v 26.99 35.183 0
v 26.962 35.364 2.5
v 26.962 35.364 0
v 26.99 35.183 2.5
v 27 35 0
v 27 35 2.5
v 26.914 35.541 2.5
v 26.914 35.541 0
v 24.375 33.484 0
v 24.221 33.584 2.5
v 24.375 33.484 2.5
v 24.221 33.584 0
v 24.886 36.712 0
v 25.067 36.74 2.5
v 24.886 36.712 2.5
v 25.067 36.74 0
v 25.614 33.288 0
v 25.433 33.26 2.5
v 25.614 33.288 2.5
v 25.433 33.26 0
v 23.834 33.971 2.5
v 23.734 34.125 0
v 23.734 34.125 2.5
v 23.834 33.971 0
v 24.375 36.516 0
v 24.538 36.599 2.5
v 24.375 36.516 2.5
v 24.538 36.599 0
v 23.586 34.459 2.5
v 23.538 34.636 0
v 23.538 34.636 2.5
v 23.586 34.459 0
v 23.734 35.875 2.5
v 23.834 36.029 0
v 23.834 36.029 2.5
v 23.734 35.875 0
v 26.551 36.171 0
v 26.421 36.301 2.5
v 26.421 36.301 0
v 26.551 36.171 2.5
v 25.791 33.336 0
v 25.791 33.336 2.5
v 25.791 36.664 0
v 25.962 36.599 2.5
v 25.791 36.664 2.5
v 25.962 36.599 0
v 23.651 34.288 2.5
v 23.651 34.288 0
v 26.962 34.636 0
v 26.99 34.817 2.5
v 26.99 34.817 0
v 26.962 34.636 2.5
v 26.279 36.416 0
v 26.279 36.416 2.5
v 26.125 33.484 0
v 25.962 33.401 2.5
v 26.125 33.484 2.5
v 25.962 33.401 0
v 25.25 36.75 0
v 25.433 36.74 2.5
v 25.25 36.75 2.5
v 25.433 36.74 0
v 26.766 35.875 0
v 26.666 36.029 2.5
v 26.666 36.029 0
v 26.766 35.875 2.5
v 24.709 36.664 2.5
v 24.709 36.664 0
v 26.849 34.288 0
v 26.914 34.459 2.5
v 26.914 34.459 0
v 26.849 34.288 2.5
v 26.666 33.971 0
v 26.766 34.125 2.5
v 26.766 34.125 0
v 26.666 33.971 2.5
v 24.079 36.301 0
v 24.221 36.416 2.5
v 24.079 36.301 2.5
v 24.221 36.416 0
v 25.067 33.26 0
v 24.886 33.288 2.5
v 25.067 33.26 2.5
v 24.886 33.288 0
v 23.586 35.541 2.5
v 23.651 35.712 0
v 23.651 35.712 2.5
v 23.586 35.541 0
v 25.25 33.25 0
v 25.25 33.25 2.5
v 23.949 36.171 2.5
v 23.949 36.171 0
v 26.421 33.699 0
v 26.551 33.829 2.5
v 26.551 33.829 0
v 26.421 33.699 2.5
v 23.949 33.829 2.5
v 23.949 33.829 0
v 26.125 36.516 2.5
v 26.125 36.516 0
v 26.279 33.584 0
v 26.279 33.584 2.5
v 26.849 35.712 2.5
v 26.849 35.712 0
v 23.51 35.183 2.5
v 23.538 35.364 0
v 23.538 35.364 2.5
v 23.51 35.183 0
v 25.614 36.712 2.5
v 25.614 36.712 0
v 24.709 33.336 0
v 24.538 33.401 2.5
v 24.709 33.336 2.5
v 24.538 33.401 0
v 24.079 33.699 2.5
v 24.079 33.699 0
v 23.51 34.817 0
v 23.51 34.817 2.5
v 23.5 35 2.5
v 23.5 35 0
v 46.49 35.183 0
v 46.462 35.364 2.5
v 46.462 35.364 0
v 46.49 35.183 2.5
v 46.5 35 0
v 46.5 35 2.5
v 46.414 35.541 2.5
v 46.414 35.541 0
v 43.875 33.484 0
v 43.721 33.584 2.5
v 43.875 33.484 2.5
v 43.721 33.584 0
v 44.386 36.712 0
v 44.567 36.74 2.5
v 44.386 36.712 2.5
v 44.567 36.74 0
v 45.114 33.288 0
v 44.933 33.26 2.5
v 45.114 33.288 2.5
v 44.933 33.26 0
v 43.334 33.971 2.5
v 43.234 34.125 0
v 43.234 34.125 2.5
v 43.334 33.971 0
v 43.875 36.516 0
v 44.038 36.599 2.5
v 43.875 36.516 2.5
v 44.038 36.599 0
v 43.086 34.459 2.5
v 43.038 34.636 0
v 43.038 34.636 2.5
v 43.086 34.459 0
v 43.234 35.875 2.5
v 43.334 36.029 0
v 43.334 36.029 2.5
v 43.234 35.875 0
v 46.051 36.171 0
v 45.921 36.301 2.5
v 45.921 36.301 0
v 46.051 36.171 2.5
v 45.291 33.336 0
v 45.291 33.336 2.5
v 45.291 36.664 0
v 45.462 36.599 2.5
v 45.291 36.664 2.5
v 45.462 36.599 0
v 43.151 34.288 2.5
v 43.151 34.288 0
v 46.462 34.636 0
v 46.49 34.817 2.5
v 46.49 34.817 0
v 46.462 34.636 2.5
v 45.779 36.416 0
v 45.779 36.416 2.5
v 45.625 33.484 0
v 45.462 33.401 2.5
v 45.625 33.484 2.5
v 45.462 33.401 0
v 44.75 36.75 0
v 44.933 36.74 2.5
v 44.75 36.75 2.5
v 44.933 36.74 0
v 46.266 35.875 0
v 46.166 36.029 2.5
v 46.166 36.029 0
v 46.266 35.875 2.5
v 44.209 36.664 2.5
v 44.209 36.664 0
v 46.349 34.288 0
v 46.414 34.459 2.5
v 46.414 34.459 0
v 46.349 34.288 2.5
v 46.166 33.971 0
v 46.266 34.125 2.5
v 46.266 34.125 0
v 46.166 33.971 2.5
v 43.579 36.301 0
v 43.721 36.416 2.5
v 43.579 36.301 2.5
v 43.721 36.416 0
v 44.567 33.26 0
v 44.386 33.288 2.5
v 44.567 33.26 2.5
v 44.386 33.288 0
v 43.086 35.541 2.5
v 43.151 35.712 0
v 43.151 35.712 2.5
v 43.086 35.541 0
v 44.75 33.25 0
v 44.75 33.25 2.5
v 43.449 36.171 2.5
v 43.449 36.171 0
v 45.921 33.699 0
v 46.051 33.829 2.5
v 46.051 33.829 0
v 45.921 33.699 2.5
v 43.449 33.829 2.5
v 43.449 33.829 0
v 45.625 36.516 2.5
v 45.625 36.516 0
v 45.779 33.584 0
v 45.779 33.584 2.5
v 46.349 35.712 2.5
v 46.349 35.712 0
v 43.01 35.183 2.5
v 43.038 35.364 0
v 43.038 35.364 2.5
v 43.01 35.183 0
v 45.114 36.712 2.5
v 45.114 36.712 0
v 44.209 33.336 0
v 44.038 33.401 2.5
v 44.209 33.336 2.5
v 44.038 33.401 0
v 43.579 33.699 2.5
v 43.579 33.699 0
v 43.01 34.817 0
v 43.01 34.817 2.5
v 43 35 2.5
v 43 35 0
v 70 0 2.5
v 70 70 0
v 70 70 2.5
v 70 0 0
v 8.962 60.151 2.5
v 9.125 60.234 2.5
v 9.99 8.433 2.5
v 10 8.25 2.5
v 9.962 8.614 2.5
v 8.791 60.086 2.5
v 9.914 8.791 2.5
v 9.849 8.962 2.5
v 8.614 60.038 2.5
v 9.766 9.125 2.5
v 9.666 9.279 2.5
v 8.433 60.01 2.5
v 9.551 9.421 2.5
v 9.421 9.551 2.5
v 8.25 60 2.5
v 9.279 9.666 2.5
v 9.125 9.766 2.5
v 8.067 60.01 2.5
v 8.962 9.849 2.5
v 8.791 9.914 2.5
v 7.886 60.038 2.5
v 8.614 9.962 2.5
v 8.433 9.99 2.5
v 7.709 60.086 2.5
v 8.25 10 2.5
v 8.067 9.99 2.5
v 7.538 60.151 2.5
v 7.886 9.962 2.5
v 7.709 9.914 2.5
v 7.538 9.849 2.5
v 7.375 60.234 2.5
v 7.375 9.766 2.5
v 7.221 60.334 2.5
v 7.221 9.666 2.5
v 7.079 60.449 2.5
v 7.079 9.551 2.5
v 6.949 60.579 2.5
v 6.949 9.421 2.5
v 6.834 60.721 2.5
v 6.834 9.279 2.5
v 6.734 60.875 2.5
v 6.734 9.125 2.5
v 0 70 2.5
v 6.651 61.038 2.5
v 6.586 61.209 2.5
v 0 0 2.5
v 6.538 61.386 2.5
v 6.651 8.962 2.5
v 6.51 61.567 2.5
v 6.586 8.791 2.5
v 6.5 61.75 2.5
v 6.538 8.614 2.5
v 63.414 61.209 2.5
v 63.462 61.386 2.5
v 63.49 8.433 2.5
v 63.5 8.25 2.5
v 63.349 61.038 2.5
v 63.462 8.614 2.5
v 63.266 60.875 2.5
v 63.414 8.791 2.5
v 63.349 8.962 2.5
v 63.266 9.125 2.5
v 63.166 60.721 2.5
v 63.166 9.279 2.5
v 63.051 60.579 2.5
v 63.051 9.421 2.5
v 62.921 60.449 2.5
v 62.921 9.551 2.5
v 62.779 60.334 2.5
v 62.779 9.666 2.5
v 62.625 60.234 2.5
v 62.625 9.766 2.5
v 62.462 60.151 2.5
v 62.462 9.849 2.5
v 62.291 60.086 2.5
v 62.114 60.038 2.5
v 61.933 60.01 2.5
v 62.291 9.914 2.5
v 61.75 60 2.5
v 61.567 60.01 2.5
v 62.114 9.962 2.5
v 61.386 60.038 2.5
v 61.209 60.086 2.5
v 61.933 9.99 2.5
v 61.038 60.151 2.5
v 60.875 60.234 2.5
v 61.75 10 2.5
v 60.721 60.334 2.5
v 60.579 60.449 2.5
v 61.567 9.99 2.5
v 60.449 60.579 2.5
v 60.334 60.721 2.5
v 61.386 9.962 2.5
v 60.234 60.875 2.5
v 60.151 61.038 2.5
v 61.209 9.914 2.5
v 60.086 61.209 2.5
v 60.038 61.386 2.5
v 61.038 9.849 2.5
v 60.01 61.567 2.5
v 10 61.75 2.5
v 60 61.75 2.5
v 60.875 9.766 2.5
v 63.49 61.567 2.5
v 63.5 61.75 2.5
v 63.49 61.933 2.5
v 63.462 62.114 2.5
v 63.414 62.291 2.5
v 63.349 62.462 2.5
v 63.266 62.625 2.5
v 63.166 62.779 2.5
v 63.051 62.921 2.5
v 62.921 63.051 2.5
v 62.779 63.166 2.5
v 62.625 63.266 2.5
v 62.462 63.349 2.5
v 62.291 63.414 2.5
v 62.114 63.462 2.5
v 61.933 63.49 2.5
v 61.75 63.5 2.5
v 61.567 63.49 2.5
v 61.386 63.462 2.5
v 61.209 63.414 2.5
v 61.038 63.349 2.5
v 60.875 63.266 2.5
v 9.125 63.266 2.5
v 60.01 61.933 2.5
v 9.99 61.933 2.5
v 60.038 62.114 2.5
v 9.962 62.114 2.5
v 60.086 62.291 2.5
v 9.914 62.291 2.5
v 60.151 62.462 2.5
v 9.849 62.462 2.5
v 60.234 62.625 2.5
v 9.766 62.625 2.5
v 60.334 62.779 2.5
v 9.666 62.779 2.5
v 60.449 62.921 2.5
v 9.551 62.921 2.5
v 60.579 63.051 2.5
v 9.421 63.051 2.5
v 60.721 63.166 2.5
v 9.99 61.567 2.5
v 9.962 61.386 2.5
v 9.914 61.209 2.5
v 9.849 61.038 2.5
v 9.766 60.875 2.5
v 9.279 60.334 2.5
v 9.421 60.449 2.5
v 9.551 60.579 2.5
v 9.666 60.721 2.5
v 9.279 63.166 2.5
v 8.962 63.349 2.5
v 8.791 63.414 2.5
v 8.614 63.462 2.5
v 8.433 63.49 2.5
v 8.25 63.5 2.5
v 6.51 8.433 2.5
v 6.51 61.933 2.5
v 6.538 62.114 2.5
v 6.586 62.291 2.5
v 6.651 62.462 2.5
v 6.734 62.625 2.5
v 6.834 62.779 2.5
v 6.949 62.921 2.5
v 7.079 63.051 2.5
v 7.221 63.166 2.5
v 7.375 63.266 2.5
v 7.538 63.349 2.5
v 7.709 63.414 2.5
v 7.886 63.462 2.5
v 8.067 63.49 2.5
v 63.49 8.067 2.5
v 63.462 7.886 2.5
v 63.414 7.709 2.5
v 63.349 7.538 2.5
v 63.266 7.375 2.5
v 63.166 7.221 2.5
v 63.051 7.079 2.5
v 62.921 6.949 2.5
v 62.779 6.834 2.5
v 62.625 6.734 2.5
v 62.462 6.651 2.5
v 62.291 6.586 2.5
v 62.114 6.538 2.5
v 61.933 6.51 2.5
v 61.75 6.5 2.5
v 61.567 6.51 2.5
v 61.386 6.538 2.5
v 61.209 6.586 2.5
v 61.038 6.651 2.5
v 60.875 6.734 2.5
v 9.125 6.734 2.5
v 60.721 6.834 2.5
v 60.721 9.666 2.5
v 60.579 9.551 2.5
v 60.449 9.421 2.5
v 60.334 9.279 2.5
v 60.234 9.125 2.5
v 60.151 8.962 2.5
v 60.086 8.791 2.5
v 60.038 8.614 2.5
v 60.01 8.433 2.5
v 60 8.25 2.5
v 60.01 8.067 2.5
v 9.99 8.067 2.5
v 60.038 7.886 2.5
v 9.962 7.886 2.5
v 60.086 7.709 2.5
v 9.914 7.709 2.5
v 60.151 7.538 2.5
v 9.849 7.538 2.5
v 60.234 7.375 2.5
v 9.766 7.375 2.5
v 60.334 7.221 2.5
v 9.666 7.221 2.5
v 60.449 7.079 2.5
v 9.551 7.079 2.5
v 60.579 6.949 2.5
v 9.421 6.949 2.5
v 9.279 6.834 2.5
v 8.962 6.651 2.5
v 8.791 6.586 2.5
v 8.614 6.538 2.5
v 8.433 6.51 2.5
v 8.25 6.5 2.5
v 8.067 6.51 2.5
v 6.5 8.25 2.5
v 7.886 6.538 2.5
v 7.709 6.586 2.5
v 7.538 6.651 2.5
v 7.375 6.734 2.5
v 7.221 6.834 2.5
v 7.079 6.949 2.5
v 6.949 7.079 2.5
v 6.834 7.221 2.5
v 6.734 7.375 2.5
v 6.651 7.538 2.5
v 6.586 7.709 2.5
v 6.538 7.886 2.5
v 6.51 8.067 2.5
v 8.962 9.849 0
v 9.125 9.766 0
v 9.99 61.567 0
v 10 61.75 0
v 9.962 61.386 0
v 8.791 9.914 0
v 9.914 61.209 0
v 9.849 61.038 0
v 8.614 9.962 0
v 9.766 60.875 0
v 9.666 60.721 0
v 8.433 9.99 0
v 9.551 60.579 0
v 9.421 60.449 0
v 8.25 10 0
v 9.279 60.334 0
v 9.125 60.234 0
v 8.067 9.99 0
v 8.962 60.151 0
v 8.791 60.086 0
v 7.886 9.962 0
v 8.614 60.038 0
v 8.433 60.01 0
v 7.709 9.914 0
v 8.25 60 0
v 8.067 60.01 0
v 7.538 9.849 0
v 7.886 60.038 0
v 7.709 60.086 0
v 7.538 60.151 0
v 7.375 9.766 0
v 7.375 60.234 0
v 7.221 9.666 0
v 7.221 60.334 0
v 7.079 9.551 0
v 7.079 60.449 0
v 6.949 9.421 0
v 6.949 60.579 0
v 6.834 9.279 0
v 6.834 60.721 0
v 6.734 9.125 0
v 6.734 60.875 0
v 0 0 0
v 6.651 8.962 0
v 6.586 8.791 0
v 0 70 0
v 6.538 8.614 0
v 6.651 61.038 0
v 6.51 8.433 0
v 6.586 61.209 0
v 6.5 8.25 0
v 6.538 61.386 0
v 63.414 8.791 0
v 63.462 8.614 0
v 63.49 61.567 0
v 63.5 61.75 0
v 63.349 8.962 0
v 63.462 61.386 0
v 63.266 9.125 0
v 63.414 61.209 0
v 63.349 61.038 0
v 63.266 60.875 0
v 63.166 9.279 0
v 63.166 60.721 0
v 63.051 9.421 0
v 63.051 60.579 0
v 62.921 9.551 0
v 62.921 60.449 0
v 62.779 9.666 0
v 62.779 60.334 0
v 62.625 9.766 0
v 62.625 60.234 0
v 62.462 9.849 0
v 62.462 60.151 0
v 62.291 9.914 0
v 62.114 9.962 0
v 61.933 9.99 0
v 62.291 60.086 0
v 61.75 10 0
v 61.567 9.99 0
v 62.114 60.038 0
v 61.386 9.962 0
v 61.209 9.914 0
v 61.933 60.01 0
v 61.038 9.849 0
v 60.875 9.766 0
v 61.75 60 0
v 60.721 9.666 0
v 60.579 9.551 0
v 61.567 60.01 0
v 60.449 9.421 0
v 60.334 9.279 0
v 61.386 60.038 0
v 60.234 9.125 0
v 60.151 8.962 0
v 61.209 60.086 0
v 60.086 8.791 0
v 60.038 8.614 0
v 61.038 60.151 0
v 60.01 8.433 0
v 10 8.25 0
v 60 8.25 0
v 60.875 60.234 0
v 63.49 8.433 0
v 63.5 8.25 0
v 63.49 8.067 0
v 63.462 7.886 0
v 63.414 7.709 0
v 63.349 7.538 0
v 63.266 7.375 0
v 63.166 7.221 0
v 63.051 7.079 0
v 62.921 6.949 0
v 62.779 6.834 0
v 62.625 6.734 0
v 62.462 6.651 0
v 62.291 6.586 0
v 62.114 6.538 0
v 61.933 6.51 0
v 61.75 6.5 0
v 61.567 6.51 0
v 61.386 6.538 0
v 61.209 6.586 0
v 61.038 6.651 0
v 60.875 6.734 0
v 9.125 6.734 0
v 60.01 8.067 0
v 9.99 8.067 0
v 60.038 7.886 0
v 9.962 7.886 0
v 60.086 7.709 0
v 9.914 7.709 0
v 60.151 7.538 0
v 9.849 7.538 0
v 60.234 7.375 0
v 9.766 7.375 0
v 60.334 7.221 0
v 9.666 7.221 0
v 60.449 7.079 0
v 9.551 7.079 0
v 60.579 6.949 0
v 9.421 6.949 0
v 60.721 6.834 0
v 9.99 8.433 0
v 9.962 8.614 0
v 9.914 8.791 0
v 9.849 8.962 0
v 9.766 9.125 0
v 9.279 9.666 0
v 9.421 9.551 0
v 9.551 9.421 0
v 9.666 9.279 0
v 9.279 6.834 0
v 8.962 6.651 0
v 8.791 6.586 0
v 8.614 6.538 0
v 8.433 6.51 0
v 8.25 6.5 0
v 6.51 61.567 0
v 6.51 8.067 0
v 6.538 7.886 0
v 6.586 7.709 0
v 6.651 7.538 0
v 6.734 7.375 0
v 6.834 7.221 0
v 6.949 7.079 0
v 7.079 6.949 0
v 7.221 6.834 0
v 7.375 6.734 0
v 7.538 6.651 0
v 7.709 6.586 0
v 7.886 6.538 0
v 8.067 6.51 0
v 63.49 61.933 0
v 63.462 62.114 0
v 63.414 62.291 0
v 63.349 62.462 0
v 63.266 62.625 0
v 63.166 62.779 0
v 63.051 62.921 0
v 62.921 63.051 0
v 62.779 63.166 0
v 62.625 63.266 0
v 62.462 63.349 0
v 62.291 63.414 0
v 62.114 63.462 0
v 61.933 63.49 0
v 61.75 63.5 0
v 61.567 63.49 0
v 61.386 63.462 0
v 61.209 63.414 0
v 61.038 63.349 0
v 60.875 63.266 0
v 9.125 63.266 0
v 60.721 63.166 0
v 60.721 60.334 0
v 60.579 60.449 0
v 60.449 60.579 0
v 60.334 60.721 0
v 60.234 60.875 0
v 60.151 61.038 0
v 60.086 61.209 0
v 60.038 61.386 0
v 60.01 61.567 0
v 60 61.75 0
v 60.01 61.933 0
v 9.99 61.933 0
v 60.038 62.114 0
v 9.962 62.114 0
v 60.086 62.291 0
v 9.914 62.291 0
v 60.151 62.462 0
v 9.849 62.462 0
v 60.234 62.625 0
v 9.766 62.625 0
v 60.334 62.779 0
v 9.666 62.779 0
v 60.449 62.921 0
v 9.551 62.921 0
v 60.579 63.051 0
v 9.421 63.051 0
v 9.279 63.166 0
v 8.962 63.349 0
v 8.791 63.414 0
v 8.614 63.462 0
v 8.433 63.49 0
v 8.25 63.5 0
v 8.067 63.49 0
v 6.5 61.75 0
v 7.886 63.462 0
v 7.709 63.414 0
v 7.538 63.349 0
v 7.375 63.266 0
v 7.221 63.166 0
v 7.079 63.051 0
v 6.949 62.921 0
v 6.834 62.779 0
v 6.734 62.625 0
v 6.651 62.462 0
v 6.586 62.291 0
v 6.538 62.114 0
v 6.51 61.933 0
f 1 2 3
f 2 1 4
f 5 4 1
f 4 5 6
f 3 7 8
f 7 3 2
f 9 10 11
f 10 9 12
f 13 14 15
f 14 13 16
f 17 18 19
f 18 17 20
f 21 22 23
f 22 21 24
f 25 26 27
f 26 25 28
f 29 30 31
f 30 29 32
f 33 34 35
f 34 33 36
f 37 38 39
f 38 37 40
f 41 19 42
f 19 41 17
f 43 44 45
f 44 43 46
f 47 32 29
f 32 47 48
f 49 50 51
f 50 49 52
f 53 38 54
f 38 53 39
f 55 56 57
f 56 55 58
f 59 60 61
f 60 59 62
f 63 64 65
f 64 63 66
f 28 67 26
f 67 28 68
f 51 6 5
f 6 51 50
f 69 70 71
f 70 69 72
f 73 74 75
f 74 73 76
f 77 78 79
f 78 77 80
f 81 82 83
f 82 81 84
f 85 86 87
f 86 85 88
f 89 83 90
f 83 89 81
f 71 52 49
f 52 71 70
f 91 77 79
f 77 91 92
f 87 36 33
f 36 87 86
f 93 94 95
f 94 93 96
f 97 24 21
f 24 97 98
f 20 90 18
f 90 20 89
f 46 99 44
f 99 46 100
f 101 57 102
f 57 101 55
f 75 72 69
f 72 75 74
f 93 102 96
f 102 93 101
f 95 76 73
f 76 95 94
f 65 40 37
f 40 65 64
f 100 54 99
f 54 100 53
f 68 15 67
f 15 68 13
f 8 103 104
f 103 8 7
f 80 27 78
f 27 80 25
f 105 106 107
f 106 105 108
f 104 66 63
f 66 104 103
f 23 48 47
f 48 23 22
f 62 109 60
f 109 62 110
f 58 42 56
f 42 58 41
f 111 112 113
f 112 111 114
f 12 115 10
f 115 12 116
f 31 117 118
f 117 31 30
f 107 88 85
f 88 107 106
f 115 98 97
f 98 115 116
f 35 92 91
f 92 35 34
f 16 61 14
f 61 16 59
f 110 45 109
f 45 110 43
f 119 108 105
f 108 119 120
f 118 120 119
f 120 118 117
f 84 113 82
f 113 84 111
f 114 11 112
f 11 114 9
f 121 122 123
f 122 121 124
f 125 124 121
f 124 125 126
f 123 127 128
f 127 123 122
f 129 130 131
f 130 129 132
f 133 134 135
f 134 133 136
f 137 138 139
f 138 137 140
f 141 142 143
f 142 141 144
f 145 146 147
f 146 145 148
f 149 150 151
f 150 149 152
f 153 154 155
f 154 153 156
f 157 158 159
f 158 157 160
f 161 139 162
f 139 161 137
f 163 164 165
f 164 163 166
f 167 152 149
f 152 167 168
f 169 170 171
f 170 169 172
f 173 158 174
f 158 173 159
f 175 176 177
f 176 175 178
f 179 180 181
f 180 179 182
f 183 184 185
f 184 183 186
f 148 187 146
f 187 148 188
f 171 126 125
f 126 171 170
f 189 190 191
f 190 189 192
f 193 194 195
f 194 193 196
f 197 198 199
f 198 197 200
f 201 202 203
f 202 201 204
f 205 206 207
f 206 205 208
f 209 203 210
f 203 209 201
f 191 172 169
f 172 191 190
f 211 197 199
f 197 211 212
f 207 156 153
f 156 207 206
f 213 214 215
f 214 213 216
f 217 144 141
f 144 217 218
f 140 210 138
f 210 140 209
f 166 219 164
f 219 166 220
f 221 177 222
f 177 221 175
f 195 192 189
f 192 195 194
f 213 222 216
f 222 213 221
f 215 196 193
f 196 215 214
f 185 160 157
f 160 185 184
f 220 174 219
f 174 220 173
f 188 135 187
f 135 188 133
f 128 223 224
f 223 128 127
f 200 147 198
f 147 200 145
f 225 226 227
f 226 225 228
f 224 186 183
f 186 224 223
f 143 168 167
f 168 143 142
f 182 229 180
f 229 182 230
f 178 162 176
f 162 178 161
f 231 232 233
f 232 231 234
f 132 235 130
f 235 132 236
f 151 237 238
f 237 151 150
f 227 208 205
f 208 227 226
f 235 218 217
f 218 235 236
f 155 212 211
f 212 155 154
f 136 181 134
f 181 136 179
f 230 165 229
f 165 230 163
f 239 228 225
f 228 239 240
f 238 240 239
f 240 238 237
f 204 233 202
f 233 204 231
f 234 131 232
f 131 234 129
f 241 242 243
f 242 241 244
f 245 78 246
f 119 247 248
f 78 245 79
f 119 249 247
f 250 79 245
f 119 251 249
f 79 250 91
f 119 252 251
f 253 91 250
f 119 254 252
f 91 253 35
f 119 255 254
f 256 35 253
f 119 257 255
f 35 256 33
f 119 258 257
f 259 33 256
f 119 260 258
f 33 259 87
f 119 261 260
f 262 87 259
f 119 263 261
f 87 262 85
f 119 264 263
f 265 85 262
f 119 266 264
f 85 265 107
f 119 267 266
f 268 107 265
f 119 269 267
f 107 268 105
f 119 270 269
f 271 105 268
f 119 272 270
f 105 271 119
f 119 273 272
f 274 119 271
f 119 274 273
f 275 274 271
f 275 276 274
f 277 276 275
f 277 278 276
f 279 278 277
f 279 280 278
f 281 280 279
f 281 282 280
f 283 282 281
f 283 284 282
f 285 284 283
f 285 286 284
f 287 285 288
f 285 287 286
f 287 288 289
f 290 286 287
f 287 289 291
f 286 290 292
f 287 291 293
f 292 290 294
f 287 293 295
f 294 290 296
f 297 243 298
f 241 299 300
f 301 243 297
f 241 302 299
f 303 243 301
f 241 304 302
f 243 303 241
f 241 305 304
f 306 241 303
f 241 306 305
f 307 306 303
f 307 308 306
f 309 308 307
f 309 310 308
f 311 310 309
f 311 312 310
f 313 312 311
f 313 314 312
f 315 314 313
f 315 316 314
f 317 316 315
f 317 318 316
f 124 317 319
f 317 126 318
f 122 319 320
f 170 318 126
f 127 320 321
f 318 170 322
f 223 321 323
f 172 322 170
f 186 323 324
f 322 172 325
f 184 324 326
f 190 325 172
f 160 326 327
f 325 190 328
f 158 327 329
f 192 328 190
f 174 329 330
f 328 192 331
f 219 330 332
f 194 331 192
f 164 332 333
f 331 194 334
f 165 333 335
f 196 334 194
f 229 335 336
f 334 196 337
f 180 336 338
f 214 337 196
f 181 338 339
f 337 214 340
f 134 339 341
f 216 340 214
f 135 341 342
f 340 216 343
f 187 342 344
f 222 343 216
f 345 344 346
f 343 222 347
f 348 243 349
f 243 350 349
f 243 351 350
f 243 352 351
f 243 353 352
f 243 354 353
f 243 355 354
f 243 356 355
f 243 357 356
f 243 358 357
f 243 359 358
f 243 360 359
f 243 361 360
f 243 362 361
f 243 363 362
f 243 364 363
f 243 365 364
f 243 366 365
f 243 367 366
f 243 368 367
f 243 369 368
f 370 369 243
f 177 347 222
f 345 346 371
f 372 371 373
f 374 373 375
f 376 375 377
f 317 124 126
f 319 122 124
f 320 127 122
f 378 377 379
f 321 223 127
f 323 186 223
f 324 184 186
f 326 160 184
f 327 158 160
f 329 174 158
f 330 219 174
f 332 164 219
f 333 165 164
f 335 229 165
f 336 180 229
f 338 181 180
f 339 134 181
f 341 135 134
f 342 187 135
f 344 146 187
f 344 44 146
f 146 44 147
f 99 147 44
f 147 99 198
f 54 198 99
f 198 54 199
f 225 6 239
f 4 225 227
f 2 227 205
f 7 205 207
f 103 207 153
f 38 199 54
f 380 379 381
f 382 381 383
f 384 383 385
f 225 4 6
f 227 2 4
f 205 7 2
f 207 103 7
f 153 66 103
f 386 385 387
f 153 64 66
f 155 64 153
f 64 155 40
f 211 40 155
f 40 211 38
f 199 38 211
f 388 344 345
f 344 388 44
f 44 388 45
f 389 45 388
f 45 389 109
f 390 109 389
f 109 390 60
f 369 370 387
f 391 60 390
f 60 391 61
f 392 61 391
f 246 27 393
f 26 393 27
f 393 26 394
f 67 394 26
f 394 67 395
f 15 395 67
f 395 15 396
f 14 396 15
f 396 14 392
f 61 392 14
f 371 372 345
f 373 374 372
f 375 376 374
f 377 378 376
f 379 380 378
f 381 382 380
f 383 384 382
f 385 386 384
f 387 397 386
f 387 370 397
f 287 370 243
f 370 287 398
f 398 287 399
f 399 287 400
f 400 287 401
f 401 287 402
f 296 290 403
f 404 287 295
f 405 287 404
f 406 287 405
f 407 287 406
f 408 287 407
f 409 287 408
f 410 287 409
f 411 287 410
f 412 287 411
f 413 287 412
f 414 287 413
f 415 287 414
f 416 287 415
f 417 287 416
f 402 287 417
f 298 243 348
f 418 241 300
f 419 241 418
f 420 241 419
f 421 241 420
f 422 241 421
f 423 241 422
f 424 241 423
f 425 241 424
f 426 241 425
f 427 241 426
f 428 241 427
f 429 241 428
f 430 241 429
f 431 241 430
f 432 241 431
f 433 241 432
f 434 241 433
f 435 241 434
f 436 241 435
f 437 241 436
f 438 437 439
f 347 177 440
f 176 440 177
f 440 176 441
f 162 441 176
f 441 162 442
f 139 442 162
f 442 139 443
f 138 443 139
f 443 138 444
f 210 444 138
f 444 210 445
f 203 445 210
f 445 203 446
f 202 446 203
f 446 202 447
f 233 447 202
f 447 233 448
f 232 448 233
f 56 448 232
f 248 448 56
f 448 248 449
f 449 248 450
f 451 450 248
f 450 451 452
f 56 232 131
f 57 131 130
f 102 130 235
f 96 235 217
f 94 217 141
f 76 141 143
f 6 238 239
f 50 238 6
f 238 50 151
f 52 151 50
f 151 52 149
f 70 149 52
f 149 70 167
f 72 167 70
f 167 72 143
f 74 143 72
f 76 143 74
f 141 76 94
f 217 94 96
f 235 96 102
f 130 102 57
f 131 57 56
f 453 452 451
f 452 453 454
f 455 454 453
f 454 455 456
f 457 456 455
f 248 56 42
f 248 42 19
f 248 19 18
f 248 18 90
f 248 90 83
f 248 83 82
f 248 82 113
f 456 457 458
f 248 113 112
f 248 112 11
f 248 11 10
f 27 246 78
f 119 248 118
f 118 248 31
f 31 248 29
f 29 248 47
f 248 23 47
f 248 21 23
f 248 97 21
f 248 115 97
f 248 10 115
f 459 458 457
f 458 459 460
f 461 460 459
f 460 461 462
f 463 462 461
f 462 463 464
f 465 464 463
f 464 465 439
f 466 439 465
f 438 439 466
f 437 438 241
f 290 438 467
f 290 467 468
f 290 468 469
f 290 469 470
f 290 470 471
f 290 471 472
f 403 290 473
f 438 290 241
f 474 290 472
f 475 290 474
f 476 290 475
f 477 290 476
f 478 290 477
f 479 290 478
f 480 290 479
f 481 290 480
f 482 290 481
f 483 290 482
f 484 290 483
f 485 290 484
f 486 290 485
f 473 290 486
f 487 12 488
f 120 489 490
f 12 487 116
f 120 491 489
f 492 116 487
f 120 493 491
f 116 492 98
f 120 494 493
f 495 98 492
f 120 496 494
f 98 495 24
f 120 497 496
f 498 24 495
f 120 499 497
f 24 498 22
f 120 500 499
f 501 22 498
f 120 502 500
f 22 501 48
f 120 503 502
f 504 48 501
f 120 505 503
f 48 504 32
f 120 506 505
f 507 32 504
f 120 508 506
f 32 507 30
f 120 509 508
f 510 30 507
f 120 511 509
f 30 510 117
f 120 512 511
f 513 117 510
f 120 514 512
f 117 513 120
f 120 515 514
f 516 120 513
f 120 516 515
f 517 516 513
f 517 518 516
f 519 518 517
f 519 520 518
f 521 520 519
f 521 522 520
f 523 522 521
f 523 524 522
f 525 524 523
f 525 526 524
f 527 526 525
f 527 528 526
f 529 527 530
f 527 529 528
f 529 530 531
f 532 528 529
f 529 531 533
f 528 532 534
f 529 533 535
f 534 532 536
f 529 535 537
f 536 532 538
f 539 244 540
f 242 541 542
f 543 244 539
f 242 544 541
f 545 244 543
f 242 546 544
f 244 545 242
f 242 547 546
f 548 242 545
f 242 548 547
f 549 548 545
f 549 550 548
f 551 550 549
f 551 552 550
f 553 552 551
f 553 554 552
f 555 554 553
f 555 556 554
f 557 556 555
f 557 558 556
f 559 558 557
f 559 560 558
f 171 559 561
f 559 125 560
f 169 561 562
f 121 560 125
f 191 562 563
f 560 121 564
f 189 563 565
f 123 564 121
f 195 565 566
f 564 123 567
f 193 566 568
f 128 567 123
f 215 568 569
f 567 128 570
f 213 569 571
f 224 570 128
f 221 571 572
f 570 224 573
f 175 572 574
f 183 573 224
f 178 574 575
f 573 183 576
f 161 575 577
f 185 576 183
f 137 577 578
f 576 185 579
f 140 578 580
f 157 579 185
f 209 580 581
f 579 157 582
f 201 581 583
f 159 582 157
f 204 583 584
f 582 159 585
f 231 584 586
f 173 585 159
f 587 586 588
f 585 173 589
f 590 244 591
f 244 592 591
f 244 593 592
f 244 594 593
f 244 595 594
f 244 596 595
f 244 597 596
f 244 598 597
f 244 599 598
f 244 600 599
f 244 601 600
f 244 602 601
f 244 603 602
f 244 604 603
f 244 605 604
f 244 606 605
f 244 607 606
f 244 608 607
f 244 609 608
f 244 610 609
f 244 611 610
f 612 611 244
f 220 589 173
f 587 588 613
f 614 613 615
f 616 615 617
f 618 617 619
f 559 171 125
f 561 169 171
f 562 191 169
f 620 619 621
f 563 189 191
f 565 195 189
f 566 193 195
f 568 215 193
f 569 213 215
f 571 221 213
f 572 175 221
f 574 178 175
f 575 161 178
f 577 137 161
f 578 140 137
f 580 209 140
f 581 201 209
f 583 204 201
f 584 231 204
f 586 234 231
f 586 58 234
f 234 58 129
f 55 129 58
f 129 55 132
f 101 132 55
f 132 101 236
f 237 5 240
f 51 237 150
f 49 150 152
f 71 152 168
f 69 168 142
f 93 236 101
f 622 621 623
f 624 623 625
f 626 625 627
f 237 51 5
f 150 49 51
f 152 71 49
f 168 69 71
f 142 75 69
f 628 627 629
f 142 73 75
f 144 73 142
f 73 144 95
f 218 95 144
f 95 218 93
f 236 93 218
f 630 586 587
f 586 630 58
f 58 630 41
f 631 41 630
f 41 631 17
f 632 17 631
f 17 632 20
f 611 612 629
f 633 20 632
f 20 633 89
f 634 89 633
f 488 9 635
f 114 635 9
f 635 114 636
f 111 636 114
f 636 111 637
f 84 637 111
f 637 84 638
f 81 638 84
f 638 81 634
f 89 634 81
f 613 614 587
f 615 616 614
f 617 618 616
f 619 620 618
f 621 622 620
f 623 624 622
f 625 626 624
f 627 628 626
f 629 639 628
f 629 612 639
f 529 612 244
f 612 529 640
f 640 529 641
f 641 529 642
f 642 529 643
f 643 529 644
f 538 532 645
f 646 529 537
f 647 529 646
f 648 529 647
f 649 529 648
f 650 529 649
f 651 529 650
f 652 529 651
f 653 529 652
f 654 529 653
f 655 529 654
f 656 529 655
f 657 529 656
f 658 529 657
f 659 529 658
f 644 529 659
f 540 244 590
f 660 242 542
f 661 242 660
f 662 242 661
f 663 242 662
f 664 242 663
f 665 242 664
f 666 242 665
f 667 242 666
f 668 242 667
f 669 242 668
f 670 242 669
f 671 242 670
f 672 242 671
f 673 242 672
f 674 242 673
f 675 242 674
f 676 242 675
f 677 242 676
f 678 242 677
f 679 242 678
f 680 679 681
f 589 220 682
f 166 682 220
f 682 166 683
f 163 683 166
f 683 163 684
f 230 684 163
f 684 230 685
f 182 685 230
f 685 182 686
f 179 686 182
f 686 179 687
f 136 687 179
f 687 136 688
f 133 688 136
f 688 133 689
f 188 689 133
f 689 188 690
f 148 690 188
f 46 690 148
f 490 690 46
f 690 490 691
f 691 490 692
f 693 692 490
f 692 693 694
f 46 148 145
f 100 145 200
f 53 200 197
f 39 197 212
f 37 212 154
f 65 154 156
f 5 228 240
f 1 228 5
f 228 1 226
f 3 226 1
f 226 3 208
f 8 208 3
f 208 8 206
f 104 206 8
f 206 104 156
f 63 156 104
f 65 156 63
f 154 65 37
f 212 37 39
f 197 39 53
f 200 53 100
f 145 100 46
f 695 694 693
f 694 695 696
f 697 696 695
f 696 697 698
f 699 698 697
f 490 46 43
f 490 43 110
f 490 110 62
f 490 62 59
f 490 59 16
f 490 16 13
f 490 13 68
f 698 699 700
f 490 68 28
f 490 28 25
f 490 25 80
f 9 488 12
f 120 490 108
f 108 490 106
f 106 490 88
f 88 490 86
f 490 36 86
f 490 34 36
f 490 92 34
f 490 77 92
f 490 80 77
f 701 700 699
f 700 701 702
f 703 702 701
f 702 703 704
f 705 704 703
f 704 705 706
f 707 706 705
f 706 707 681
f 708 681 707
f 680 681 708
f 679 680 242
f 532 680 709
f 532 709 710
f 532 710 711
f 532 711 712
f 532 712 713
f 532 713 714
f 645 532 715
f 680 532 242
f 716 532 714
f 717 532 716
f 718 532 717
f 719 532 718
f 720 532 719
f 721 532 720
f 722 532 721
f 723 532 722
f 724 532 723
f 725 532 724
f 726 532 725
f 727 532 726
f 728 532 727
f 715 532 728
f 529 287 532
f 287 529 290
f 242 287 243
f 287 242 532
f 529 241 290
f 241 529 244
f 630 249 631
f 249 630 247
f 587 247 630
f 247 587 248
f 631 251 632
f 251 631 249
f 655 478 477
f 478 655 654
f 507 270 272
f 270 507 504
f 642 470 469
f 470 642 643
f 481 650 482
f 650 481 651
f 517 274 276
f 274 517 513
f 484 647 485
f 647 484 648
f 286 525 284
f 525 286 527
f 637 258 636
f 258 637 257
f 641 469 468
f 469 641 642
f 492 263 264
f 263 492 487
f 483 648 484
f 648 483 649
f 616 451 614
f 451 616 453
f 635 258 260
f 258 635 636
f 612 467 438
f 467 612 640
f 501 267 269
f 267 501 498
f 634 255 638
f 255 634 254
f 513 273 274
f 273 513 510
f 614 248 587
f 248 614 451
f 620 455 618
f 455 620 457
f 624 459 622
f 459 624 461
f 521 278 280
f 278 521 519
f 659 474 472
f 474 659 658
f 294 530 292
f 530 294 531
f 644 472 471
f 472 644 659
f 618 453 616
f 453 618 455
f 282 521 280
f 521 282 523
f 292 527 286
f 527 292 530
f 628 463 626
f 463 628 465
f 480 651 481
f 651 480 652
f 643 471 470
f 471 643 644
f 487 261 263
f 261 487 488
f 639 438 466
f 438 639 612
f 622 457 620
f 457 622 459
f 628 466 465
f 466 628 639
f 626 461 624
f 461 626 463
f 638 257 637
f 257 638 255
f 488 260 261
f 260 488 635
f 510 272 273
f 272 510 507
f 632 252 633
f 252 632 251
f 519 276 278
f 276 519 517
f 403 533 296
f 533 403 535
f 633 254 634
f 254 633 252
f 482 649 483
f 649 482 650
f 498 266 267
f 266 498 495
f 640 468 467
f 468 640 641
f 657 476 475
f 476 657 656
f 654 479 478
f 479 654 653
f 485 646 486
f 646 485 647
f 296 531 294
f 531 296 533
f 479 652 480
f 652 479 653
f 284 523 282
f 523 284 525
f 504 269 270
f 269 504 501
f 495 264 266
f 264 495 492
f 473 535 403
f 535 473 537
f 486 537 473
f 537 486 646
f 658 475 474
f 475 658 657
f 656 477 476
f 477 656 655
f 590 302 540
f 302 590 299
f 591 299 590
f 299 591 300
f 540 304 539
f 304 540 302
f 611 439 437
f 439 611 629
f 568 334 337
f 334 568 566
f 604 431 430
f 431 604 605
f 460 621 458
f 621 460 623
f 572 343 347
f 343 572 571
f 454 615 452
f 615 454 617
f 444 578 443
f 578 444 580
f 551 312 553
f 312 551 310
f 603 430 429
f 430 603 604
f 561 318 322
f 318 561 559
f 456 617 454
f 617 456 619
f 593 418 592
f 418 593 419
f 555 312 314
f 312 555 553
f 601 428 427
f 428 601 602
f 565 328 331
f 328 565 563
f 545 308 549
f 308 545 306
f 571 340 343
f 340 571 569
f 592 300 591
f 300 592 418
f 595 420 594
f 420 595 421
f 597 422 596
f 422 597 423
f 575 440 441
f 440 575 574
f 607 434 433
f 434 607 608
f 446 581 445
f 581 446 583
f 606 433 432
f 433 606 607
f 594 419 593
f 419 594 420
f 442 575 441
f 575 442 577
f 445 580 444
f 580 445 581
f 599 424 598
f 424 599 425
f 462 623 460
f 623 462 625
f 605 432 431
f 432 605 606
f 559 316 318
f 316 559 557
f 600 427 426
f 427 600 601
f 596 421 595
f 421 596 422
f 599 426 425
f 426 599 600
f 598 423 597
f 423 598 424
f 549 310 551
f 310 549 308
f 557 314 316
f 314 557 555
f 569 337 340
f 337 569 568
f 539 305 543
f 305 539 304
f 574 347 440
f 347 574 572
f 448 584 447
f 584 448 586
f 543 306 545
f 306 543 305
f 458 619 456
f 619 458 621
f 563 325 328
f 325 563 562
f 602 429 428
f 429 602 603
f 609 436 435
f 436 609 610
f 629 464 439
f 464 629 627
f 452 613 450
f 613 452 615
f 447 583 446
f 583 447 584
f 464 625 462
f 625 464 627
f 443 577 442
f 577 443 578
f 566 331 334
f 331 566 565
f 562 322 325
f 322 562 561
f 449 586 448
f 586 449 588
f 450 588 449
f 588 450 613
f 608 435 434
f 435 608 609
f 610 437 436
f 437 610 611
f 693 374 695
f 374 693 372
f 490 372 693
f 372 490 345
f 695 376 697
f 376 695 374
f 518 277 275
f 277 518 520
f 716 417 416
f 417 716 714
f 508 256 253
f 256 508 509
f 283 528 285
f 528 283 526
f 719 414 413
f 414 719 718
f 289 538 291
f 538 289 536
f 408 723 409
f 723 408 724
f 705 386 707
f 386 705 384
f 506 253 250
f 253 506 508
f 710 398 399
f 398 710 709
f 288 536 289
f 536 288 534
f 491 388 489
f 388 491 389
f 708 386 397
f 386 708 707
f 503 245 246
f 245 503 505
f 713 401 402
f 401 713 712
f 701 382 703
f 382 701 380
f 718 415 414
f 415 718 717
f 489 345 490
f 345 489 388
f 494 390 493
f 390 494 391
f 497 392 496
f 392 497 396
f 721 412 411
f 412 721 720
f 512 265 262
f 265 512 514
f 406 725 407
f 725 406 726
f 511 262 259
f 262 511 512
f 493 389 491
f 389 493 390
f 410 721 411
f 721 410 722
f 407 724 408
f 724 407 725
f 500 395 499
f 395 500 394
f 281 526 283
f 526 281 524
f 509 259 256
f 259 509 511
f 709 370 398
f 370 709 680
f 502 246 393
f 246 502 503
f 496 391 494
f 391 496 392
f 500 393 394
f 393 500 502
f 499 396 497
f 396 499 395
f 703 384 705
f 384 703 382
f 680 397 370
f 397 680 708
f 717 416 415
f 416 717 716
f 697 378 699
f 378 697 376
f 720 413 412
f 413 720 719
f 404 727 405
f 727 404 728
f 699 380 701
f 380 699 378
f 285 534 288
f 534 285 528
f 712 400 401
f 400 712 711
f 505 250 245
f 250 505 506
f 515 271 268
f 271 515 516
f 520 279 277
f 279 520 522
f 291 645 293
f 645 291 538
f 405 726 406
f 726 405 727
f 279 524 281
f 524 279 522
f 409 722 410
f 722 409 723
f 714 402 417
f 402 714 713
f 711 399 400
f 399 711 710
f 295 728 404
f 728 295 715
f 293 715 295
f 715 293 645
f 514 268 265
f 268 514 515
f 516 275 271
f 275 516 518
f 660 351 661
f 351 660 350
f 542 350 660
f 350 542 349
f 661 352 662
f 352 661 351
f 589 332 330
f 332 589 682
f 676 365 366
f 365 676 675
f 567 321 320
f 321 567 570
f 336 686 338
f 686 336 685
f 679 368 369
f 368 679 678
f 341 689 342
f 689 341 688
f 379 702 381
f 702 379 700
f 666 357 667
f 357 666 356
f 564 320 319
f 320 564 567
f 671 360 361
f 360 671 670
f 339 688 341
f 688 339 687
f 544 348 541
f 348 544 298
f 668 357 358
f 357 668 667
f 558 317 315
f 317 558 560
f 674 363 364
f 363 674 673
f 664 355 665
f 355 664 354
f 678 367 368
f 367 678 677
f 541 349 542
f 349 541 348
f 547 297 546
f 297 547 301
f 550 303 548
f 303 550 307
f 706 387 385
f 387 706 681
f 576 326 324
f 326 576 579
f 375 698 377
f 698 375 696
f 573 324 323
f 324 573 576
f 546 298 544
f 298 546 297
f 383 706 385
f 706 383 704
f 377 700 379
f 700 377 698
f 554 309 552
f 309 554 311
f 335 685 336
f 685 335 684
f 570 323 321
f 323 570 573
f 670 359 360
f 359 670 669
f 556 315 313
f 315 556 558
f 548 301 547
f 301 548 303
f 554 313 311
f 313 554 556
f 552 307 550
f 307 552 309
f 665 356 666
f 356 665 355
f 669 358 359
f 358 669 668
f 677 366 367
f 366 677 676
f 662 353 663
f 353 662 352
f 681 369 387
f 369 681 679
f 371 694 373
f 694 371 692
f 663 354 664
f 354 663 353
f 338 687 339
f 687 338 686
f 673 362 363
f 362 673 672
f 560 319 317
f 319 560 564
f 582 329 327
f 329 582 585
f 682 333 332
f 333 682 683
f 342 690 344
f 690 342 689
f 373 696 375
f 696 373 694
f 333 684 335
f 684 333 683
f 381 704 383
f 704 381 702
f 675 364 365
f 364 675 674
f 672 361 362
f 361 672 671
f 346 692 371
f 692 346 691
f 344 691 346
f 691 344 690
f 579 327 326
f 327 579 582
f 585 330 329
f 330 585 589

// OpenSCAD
M2 = 1;
M25 = 1.25;
M3 = 1.75;
PlateHeight = 2.5;


module screw_hole(size, x, y, height=PlateHeight+1) {
    union() {
       translate([x, y, -1])
       cylinder(h=5, r=size, $fn=60); 
    };
}

// x and y are the center point for the battery mount.
module battery_mount(x, y, size=M3, rotation=0) {
    offset = 19.5 / 2;
    union() {
        screw_hole(size, x-offset, y);
        screw_hole(size, x+offset, y);
    }
}

difference() {
    cube([70, 70, PlateHeight]);
    screw_hole(M3, 8.25, 8.25);
    screw_hole(M3, 61.75, 8.25);
    screw_hole(M3, 8.25, 61.75);
    screw_hole(M3, 61.75, 61.75);
    battery_mount(35, 35);
}
